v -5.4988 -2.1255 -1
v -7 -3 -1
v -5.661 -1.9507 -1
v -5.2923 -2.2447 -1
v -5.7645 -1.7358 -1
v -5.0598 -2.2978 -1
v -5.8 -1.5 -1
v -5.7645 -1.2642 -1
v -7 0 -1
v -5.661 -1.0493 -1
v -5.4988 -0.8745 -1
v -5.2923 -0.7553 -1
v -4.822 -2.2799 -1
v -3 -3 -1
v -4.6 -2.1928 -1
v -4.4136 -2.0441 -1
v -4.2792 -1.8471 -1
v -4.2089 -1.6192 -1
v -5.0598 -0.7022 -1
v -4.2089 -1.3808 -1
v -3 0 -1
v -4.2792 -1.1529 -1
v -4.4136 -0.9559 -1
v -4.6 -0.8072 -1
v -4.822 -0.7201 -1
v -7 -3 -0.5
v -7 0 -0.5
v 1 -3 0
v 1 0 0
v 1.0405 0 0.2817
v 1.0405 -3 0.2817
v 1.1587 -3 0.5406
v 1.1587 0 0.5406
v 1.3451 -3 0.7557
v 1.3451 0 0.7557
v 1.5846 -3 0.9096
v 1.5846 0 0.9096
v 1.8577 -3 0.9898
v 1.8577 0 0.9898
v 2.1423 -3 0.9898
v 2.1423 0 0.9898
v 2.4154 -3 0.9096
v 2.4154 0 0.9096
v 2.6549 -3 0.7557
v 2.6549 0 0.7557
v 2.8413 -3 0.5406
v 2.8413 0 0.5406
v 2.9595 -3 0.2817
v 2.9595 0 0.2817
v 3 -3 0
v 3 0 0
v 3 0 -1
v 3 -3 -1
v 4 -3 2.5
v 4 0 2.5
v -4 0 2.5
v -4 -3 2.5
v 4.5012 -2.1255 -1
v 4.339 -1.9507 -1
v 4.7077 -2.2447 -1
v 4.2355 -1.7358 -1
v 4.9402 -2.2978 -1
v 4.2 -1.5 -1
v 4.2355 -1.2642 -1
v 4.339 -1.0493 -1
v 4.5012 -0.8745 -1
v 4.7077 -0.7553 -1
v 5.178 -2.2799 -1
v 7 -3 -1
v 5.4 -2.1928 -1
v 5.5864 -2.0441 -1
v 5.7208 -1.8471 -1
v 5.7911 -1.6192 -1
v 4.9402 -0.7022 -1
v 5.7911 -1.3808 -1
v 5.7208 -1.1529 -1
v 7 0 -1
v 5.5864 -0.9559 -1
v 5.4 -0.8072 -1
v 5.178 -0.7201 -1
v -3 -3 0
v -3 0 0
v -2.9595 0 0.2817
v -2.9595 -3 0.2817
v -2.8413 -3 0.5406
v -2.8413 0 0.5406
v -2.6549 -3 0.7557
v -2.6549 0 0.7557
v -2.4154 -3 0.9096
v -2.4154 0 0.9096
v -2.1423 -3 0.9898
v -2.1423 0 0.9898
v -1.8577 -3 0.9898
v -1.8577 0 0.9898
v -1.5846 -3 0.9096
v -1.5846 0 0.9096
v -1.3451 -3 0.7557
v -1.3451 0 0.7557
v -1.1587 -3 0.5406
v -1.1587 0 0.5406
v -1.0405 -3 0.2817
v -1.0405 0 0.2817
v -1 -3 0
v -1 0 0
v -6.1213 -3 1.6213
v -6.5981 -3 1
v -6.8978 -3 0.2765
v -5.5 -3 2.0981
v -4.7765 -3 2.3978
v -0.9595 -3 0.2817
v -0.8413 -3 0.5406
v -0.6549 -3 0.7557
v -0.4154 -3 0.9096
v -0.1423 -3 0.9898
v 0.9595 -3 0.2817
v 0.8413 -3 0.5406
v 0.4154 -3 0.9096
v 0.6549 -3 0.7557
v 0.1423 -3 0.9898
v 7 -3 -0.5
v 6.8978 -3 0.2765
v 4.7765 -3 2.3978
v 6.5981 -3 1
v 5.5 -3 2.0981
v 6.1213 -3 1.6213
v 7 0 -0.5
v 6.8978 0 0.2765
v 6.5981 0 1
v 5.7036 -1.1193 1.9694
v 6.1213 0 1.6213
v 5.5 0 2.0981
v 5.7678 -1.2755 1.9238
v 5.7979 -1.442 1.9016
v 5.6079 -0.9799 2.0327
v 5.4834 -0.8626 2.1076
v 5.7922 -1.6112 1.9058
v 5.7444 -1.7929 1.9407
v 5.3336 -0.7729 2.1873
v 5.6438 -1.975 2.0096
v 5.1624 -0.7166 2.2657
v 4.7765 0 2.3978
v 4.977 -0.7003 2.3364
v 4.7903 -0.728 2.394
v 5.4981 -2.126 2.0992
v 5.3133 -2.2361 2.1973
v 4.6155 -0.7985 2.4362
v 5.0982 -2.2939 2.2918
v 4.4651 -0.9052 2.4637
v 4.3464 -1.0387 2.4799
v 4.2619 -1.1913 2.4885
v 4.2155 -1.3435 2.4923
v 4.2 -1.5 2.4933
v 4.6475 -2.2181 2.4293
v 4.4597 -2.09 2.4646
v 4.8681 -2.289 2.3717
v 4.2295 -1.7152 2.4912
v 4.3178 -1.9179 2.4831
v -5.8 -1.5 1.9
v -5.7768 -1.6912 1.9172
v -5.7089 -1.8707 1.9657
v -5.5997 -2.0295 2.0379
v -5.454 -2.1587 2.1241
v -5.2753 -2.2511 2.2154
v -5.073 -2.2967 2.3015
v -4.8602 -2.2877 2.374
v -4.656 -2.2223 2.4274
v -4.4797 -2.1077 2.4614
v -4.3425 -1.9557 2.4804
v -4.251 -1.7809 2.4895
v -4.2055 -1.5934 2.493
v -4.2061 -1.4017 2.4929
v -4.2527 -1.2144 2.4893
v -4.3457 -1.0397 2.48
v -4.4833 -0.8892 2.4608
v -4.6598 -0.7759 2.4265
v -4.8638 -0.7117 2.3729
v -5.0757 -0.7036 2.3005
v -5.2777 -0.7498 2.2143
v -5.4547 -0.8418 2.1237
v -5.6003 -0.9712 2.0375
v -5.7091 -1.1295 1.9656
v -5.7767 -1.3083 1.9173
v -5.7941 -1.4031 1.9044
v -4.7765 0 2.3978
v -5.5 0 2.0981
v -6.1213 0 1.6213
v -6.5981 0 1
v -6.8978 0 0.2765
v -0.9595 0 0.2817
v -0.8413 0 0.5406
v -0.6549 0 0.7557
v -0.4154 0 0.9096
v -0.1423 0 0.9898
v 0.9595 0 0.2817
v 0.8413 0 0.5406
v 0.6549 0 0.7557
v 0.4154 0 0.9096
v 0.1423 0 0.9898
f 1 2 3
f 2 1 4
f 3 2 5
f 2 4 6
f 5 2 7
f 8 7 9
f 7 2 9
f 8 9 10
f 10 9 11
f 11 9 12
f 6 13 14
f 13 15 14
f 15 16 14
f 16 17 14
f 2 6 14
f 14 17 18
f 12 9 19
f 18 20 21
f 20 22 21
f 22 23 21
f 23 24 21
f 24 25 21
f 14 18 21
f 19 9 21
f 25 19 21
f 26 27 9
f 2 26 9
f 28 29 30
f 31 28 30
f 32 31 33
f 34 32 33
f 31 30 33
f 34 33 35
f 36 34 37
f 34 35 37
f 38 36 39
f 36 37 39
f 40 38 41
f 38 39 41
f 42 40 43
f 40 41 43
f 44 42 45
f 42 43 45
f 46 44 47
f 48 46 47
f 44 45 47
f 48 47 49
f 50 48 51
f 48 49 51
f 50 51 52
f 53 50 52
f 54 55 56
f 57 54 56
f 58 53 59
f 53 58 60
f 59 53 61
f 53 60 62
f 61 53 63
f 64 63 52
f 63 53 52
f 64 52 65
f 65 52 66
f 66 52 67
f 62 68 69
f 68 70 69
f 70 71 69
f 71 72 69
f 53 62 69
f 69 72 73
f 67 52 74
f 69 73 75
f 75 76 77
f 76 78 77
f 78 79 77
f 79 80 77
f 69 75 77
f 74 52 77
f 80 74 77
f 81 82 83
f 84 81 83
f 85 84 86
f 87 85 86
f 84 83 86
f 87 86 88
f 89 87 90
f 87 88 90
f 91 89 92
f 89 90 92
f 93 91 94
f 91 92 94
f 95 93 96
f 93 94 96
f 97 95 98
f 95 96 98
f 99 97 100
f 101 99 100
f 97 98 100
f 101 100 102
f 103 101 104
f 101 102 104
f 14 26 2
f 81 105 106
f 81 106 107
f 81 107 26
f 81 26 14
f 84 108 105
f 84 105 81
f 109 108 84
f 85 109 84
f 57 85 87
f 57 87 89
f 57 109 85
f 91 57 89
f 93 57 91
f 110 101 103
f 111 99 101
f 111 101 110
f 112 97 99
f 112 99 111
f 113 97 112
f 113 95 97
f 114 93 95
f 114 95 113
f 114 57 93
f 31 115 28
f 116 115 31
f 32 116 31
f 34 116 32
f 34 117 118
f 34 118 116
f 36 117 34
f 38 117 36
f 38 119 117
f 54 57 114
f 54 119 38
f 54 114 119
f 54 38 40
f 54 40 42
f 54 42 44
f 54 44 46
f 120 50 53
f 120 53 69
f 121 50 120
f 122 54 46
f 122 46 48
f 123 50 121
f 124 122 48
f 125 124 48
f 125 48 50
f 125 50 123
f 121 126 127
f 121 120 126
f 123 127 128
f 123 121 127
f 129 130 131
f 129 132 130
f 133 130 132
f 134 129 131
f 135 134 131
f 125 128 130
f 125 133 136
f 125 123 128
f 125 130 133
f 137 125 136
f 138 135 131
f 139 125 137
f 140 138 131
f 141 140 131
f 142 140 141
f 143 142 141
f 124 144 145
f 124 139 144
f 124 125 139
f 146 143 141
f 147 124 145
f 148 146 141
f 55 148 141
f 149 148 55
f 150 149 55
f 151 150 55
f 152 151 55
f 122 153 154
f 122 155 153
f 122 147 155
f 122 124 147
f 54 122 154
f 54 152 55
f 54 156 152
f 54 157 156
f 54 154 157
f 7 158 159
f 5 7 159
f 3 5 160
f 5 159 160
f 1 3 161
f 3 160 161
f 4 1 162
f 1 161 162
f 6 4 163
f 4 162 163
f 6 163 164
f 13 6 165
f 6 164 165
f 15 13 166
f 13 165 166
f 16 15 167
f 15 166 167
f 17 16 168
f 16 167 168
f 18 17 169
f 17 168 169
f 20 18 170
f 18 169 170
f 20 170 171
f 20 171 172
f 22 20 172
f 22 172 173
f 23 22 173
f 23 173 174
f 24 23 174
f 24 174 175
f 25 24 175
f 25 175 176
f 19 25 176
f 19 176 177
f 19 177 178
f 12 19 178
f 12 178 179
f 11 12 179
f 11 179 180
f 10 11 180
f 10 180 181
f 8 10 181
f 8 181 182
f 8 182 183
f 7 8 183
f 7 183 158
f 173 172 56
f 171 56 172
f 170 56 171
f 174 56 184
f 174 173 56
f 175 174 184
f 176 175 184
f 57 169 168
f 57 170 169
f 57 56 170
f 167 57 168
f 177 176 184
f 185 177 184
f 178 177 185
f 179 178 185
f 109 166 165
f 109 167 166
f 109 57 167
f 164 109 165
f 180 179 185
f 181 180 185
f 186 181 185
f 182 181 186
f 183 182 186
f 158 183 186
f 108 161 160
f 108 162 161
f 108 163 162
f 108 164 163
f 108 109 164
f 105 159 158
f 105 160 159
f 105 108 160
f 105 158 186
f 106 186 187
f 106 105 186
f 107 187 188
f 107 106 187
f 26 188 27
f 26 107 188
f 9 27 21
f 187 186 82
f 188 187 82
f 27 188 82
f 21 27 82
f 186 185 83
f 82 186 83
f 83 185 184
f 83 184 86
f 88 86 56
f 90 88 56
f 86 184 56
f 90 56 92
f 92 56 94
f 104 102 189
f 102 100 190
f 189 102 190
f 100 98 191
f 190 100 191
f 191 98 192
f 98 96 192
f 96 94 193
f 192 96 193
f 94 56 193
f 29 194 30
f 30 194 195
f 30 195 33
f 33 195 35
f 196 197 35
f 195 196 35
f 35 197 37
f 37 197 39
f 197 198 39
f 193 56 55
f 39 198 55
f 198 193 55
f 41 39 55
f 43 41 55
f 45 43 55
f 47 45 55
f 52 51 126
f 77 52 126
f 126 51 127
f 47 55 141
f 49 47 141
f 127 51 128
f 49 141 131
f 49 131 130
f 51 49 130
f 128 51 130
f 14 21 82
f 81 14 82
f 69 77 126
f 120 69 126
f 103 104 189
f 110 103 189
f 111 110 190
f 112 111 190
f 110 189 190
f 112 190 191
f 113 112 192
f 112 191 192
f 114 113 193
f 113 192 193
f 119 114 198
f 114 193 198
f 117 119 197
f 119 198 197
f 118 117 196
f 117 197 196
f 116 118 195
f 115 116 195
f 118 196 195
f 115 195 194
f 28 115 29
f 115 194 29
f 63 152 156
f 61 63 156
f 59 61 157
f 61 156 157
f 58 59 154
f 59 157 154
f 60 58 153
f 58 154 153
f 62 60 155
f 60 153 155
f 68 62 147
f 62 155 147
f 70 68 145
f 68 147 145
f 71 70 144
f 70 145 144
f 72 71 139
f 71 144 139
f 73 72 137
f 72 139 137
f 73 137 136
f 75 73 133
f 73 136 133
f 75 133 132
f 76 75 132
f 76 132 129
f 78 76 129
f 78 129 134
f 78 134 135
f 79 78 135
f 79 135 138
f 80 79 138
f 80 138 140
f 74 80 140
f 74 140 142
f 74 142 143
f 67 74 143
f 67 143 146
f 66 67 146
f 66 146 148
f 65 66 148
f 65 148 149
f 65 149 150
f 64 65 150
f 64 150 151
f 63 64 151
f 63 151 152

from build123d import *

# Parameters (mm, degrees)
F1_DEPTH = 3
F2_R     = 3
F4_D     = 1.6


with BuildPart() as f1:
    # F0 (on Front) → F1 (new body)
    with BuildSketch(Plane.XZ):
        with BuildLine():
            ThreePointArc((1, 0), (2, 1), (3, 0))
            Line((3, 0), (3, -1))
            Line((3, -1), (7, -1))
            Line((7, -1), (7, 2.5))
            Line((7, 2.5), (-7, 2.5))
            Line((-7, 2.5), (-7, -1))
            Line((-7, -1), (-3, -1))
            Line((-3, -1), (-3, 0))
            ThreePointArc((-3, 0), (-2, 1), (-1, 0))
            ThreePointArc((-1, 0), (0, 1), (1, 0))
        make_face()
    extrude(amount=F1_DEPTH)

    # F2
    f2_edges = [f1.edges().sort_by_distance(p)[0] for p in [
        (7, -1.5, 2.5),
        (-7, -1.5, 2.5),
    ]]
    fillet(f2_edges, radius=F2_R)

    # F4 (through all)
    with Locations(Plane(origin=(0, 0, -1), x_dir=(1, 0, 0), z_dir=(0, 0, -1))):
        with Locations((-5, 1.5), (5, 1.5)):
            Hole(F4_D / 2)


solid = f1.part
